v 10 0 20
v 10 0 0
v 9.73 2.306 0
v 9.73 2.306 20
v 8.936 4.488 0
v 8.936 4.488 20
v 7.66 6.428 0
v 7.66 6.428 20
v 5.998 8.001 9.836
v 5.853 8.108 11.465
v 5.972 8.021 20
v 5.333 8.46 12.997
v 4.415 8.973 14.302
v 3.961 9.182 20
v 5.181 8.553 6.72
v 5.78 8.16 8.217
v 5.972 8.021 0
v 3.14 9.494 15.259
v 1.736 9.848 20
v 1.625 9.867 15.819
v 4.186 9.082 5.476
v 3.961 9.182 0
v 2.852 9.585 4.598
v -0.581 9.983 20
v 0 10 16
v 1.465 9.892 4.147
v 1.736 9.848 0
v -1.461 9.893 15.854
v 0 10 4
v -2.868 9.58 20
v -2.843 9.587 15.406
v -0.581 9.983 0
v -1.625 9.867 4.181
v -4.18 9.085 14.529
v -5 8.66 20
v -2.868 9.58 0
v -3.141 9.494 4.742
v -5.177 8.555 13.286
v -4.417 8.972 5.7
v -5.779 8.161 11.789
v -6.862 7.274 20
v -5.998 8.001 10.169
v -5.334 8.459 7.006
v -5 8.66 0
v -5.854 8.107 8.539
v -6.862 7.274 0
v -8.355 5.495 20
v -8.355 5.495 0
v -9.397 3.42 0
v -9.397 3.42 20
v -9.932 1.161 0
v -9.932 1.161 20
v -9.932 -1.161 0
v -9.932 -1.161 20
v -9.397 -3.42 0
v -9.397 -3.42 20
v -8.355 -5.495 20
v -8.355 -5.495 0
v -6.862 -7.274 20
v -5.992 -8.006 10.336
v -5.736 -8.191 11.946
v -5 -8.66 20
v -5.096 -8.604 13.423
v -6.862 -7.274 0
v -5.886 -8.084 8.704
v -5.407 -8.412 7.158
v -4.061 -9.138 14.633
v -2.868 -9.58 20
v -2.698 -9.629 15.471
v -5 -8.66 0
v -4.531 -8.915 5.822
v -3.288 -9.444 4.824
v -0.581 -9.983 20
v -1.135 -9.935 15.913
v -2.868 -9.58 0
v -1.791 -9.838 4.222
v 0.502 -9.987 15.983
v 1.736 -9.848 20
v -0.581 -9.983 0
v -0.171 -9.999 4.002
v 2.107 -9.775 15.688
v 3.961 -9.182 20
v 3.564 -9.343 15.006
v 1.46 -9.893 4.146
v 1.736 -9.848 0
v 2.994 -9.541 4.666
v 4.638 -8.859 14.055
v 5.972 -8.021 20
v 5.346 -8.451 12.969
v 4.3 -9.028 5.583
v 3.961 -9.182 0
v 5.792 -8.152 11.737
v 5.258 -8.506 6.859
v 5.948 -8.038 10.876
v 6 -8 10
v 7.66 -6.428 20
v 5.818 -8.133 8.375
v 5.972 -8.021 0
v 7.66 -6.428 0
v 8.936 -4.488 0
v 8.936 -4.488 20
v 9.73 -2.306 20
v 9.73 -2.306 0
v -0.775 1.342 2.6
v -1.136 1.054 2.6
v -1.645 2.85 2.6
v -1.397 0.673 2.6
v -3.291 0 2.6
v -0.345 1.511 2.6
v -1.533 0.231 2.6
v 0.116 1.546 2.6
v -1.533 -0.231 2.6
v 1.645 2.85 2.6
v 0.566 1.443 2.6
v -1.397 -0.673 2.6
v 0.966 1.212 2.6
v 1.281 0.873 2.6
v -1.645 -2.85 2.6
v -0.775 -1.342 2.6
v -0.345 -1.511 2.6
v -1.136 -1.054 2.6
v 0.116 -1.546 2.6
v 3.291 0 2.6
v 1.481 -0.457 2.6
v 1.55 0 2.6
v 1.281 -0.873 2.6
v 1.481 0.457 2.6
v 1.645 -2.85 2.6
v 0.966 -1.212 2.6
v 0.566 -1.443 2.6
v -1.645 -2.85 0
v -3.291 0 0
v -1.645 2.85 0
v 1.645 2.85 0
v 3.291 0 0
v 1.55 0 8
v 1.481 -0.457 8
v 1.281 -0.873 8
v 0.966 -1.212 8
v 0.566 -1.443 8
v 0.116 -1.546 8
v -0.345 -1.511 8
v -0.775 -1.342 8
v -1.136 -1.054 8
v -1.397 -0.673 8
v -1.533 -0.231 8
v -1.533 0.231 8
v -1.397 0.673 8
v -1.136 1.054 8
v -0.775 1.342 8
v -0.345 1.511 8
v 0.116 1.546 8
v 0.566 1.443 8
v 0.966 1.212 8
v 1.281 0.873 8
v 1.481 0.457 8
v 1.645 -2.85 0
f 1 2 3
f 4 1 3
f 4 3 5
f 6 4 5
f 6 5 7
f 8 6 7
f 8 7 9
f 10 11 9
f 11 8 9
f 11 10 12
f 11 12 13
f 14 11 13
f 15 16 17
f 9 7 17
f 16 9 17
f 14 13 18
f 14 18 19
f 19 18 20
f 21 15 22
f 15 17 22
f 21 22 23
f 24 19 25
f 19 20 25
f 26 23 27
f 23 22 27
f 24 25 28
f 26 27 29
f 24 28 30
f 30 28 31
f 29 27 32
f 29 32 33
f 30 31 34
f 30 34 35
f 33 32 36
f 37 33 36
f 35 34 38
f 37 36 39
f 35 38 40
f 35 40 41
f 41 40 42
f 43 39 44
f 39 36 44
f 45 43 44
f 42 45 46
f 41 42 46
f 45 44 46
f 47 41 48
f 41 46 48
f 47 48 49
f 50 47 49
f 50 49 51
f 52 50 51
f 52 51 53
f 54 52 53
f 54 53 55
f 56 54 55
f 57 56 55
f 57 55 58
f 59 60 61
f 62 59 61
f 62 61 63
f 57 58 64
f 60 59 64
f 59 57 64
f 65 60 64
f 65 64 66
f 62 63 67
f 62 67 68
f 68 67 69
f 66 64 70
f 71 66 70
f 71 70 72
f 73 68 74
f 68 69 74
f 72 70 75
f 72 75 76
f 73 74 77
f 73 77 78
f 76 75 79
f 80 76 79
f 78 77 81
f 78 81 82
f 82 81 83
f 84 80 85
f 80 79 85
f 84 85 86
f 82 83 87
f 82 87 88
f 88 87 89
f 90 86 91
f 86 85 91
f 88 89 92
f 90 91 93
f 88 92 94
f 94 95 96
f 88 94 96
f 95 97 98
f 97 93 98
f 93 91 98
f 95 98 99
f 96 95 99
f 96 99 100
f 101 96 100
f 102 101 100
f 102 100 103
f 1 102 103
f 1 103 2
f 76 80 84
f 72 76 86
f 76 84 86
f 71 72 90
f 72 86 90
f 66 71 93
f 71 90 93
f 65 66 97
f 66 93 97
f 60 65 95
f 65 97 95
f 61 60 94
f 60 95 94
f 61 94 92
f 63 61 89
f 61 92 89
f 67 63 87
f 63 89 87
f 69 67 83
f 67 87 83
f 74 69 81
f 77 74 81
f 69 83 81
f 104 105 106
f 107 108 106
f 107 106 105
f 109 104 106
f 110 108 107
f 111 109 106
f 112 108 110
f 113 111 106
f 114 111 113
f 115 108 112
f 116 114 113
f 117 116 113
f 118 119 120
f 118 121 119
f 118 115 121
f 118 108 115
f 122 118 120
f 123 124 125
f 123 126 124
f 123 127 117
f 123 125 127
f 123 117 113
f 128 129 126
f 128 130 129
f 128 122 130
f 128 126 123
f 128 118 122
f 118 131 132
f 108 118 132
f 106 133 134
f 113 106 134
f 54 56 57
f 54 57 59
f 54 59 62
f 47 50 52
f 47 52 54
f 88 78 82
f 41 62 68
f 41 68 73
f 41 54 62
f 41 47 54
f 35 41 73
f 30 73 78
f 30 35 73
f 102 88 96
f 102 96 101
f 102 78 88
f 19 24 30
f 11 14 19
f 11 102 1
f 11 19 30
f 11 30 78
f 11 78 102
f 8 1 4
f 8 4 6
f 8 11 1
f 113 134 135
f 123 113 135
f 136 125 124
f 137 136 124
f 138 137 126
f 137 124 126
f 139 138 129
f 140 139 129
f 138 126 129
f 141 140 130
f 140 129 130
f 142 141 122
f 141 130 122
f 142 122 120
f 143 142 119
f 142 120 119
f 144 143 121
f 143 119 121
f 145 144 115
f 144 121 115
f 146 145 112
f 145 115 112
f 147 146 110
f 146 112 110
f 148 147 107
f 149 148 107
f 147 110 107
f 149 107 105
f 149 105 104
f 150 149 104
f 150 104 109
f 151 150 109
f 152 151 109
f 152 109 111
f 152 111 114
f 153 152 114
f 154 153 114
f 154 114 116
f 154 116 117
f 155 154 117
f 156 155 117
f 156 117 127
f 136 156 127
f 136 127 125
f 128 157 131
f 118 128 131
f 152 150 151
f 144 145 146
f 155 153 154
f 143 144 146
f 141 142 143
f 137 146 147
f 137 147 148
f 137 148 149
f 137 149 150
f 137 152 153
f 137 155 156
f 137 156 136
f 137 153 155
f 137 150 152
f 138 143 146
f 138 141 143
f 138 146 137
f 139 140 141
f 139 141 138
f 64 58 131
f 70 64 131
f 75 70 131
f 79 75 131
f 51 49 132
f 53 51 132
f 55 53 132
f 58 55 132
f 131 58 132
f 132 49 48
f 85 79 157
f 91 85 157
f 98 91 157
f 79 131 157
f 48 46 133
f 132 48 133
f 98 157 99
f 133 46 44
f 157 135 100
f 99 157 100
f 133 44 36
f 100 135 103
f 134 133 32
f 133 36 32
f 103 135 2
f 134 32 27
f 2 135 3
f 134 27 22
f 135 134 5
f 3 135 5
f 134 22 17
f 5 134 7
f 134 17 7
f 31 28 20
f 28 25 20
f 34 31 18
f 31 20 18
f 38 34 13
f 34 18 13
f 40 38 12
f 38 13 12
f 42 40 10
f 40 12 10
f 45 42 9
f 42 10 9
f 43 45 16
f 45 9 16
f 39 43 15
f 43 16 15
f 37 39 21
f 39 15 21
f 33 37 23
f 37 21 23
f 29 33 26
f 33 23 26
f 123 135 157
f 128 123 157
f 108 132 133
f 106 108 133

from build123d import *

# Parameters (mm, degrees)
F0_R      = 10
F1_DEPTH  = 20
F2_R      = 10
F3_DEPTH  = 50
F4_R      = 1.55
F5_DEPTH  = 2.6
F5_FACE_R = 1.55
F6_DEPTH  = 8


with BuildPart() as f1:
    # F0 (on Top) → F1 (new body)
    with BuildSketch(Plane.XY):
        Circle(F0_R)
    extrude(amount=F1_DEPTH)

    # F2 (on Right) → F3 (cut, symmetric)
    with BuildSketch(Plane.YZ):
        with Locations((18, 10)):
            Circle(F2_R)
        with Locations((-18, 10)):
            Circle(F2_R)
    extrude(amount=F3_DEPTH, both=True, mode=Mode.SUBTRACT)

    # F4 (on face) → F5 (cut)
    with BuildSketch(Plane(origin=(0, 0, 0), x_dir=(1, 0, 0), z_dir=(0, 0, -1))):
        Polygon((1.645448, 2.85), (-1.645448, 2.85), (-3.290897, 0), (-1.645448, -2.85), (1.645448, -2.85), (3.290897, 0), align=None)
        Circle(F4_R, mode=Mode.SUBTRACT)
    extrude(amount=-F5_DEPTH, mode=Mode.SUBTRACT)

    # F5_face (on face) → F6 (cut)
    with BuildSketch(Plane(origin=(0, 0, 0), x_dir=(1, 0, 0), z_dir=(0, 0, -1))):
        Circle(F5_FACE_R)
    extrude(amount=-F6_DEPTH, mode=Mode.SUBTRACT)


solid = f1.part
